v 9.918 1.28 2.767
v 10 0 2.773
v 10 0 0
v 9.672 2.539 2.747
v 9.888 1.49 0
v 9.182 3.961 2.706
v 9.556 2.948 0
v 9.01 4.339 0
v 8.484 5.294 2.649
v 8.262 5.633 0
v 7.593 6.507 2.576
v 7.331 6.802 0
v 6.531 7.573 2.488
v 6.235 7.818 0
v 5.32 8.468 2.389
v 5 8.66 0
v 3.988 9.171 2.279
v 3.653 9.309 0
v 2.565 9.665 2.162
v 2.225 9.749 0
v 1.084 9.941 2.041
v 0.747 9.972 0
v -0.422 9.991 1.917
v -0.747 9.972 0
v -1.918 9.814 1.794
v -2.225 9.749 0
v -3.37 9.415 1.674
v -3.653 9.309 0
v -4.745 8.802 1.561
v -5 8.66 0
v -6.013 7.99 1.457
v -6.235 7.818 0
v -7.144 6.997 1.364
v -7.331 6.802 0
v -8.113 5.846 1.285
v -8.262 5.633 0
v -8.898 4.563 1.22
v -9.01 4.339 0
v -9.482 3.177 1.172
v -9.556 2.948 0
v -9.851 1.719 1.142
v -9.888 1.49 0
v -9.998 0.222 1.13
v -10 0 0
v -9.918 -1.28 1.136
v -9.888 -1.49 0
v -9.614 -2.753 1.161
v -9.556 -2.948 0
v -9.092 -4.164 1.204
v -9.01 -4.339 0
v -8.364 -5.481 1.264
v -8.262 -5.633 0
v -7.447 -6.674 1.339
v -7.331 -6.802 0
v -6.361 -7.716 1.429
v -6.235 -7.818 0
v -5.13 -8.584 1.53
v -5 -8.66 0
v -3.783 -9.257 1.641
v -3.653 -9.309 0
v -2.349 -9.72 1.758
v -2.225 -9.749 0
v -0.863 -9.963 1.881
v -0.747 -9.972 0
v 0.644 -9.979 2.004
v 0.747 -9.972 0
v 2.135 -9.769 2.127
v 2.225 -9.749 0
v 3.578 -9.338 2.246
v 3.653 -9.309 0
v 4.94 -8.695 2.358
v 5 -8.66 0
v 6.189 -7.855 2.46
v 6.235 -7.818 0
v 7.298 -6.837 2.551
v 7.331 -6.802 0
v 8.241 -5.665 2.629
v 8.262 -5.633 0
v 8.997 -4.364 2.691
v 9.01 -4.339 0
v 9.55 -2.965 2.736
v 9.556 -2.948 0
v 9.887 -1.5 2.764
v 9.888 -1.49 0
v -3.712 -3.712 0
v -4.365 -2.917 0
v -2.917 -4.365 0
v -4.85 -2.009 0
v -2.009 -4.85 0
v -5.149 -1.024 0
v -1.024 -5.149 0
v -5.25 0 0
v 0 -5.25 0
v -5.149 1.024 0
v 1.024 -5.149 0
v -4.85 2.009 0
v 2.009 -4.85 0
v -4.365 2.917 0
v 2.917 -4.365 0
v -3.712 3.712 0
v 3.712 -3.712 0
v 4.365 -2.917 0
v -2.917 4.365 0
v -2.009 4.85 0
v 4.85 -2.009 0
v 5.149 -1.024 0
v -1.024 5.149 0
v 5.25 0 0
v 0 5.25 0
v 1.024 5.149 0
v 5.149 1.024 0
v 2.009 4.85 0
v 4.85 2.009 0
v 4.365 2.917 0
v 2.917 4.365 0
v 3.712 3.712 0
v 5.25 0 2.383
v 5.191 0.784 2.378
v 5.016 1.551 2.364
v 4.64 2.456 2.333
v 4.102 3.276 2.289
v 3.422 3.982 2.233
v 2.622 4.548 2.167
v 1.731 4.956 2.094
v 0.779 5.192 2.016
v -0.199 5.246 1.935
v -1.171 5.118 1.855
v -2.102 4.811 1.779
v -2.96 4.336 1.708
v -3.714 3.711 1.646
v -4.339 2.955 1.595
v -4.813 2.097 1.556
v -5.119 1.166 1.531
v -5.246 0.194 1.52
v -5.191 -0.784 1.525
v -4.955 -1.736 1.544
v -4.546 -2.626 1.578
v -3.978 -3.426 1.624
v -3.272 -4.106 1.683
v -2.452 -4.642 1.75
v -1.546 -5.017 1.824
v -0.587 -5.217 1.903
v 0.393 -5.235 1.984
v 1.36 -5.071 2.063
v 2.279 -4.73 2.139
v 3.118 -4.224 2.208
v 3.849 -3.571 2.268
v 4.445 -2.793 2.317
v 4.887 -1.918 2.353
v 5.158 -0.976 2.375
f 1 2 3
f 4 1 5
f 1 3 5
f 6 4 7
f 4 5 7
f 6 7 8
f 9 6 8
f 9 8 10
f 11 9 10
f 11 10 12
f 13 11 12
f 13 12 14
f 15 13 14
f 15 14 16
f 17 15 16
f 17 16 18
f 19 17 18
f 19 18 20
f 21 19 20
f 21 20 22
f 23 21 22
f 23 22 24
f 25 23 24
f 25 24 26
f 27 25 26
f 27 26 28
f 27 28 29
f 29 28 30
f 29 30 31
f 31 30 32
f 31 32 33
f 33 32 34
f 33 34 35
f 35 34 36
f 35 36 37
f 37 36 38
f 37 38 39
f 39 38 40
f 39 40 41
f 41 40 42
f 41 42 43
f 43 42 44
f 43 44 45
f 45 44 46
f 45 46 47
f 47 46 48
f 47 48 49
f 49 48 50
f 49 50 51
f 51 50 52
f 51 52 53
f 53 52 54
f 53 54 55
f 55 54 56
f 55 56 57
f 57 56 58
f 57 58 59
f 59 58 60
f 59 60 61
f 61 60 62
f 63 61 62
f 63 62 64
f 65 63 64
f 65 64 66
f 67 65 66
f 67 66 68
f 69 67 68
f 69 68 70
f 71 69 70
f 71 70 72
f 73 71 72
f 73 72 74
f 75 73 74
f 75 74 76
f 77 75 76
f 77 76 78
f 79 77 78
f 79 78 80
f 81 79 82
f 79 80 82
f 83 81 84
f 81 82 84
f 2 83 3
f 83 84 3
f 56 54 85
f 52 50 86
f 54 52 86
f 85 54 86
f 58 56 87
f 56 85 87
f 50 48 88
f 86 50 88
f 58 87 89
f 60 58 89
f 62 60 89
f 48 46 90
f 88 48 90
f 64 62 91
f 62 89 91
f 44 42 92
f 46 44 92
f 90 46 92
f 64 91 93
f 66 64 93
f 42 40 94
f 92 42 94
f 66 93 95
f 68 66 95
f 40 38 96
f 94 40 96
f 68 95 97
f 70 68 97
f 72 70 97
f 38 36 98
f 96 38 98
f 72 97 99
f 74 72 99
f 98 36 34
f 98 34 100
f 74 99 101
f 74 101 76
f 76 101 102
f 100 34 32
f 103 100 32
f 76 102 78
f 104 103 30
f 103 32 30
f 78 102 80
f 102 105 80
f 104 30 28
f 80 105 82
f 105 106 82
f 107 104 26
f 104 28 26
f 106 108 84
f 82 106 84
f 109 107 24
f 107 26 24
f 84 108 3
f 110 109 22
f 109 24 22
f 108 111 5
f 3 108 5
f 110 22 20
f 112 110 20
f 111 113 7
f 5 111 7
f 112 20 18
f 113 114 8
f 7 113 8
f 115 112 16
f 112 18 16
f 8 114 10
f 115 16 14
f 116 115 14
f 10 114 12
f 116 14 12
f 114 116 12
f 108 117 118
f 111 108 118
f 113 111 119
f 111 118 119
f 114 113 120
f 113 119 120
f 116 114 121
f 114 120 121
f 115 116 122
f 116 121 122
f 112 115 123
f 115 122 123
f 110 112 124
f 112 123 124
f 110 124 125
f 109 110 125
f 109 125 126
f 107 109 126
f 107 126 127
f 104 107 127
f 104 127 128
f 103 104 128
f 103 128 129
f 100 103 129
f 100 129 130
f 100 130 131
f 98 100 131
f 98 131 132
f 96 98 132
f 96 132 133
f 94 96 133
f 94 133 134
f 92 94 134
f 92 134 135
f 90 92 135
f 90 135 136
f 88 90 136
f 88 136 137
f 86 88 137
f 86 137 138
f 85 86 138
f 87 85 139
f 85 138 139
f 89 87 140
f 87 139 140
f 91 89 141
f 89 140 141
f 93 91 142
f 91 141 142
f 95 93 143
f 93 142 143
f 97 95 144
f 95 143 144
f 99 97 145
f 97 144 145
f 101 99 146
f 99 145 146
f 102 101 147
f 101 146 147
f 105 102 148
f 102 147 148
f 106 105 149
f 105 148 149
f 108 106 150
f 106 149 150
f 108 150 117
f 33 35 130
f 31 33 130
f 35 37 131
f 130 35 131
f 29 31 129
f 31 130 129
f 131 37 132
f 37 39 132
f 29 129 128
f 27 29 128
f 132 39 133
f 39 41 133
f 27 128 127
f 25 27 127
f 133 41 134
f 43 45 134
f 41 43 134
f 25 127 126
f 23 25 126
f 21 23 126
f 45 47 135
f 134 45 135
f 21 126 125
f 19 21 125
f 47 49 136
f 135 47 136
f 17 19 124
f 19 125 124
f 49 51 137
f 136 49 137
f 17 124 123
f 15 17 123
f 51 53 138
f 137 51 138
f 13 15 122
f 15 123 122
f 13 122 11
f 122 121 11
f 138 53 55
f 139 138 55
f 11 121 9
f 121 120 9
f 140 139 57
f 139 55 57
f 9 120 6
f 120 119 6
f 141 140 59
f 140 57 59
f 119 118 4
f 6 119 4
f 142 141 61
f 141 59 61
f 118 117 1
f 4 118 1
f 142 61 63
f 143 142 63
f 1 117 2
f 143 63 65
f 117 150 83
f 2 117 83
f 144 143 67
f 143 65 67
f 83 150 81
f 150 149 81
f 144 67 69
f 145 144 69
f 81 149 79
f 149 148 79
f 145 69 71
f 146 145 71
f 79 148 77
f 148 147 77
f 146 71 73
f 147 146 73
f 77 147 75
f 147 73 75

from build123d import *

# Parameters (mm, degrees)
F0_R     = 10
F1_DEPTH = 5
F2_R     = 5.25
F3_DEPTH = 5.001
F6_DEPTH = 50


with BuildPart() as f1:
    # F0 (on Top) → F1 (new body)
    with BuildSketch(Plane.XY):
        Circle(F0_R)
    extrude(amount=F1_DEPTH)

    # F2 (on face) → F3 (cut, through all)
    with BuildSketch(Plane.XY.offset(5)):
        Circle(F2_R)
    extrude(amount=-F3_DEPTH, mode=Mode.SUBTRACT)

    # F5 (on offset) → F6 (cut)
    with BuildSketch(Plane.XZ.offset(25)):
        Polygon((-11.632799, 5.720356), (-23.740912, 0), (45.850801, 5.720356), align=None)
    extrude(amount=-F6_DEPTH, mode=Mode.SUBTRACT)


solid = f1.part
